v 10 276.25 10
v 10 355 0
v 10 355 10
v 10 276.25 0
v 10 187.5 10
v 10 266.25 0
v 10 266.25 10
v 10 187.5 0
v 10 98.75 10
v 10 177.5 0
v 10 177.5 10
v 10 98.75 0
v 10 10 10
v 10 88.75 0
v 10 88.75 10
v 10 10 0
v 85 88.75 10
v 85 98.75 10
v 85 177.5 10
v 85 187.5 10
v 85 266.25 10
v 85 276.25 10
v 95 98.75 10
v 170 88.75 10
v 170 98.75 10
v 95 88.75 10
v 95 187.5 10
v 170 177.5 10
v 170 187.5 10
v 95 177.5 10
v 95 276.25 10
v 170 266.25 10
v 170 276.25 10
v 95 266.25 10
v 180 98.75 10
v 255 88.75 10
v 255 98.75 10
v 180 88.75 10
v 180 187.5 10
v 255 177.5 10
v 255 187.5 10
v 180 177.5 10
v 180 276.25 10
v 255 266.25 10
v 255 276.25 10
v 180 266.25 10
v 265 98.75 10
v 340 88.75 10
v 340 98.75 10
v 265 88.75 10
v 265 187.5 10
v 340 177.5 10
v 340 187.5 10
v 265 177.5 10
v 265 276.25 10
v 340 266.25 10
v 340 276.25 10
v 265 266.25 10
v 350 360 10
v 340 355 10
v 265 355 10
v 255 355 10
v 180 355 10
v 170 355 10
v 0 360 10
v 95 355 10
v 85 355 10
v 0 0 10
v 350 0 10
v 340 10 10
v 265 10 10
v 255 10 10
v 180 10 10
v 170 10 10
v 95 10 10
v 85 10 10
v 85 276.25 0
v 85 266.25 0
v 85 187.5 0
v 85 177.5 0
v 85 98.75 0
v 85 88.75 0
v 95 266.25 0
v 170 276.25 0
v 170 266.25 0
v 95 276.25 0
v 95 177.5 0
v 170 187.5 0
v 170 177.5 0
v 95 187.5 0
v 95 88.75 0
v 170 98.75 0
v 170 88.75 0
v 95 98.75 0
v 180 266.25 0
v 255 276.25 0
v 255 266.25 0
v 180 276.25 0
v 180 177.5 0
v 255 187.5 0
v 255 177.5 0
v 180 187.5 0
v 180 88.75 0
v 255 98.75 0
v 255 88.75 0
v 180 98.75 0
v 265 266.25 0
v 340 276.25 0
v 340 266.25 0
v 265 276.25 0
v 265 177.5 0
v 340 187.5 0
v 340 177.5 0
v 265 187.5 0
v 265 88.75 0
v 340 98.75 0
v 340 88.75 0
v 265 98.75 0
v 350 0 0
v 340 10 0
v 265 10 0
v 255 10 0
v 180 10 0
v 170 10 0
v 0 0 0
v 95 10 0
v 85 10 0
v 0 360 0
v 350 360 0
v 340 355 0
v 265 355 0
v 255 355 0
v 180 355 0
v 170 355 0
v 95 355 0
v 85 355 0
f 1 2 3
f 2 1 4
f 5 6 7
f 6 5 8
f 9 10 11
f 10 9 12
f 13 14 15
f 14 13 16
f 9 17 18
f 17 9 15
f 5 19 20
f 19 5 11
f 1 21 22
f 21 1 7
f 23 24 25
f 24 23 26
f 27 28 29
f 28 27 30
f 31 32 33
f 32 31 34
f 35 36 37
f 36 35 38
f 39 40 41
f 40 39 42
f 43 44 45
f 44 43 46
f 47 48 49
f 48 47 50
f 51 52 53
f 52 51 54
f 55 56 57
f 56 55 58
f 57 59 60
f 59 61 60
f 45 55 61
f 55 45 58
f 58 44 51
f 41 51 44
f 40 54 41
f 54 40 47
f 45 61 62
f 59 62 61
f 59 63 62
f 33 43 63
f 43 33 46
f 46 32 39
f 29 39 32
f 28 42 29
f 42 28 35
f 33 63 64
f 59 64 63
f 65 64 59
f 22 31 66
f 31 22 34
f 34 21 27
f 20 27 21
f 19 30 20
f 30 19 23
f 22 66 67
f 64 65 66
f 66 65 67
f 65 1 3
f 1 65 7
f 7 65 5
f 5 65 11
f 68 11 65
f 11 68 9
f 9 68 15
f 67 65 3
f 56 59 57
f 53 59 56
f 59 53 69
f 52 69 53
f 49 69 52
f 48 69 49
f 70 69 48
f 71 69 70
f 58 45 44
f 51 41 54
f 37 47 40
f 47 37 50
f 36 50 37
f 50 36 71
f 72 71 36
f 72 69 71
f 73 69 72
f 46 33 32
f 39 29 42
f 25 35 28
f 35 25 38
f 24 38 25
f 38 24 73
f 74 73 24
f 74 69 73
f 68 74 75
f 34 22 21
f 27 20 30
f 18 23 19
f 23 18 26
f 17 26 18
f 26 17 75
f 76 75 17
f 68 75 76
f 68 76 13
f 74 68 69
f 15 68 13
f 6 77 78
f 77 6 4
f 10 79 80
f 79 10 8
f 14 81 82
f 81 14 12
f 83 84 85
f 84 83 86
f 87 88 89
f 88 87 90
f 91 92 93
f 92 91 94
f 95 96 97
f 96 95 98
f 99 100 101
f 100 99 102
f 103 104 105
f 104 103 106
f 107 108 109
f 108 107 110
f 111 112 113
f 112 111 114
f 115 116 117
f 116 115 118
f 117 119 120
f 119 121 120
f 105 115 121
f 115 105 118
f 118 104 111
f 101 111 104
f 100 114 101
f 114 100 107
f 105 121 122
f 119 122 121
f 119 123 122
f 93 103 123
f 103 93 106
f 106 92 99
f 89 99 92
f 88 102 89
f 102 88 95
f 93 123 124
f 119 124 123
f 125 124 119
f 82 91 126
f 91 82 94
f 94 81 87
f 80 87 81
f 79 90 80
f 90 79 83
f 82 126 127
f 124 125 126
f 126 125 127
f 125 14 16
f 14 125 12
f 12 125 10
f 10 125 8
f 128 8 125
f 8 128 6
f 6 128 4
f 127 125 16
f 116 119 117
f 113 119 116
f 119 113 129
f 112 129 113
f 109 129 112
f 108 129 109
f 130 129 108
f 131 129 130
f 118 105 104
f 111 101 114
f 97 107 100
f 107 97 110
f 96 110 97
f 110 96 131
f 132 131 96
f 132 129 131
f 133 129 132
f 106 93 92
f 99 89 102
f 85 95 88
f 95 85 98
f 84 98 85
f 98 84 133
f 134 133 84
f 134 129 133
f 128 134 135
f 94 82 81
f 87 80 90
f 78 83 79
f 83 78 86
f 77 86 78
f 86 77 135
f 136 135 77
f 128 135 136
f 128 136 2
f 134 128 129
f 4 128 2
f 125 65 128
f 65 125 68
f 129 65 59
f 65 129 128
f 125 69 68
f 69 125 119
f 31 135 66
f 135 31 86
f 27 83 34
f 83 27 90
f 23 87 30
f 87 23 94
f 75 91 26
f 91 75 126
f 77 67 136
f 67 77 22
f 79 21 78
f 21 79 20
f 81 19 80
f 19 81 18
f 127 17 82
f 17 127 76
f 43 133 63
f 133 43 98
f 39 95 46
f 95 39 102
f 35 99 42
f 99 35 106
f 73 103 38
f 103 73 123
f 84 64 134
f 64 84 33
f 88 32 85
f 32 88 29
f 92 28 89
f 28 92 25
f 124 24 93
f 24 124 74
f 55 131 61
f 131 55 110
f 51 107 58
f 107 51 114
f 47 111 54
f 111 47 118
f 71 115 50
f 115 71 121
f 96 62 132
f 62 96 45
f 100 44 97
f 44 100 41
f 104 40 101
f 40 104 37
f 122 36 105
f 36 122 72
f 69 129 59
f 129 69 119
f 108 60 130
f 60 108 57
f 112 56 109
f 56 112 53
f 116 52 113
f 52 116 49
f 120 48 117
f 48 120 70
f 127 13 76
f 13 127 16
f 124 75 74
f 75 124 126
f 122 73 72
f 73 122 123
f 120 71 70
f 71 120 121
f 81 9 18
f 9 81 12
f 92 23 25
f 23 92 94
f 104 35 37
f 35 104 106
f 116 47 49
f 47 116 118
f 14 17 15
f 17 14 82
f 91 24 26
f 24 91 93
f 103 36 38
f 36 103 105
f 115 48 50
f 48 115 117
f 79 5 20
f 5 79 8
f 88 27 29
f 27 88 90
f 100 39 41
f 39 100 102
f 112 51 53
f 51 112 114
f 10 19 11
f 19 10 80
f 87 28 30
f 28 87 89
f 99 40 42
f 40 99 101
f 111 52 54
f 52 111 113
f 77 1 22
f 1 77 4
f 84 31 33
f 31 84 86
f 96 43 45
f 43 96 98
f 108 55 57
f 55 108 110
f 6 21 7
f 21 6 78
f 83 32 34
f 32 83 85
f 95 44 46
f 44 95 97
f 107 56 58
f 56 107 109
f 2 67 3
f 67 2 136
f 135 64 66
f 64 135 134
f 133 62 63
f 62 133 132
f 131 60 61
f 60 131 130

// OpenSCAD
// face_band.scad reused for back upper band

width = 350;
band_h = 360;
thk = 10;
full_height = 720;
h_bar_count = 9;
h_gap = (full_height - h_bar_count * thk) / (h_bar_count - 1);
v_gap_count = 4;
v_bars = v_gap_count + 1;
v_gap = (width - v_bars * thk) / v_gap_count;
$fn = 32;

module face_band(w=width, bh=band_h, t=thk) {
    union() {
        for (i = [0 : v_bars - 1]) {
            x = i * (t + v_gap);
            translate([x, 0, 0]) cube([t, bh, t]);
        }
        for (j = [0 : h_bar_count - 1]) {
            y_full = j * (t + h_gap);
            if (y_full < bh && (y_full + t) > 0) {
                intersection() {
                    translate([0, y_full, 0]) cube([w, t, t]);
                    translate([0, 0, 0]) cube([w, bh, t]);
                }
            }
        }
    }
}

face_band();
